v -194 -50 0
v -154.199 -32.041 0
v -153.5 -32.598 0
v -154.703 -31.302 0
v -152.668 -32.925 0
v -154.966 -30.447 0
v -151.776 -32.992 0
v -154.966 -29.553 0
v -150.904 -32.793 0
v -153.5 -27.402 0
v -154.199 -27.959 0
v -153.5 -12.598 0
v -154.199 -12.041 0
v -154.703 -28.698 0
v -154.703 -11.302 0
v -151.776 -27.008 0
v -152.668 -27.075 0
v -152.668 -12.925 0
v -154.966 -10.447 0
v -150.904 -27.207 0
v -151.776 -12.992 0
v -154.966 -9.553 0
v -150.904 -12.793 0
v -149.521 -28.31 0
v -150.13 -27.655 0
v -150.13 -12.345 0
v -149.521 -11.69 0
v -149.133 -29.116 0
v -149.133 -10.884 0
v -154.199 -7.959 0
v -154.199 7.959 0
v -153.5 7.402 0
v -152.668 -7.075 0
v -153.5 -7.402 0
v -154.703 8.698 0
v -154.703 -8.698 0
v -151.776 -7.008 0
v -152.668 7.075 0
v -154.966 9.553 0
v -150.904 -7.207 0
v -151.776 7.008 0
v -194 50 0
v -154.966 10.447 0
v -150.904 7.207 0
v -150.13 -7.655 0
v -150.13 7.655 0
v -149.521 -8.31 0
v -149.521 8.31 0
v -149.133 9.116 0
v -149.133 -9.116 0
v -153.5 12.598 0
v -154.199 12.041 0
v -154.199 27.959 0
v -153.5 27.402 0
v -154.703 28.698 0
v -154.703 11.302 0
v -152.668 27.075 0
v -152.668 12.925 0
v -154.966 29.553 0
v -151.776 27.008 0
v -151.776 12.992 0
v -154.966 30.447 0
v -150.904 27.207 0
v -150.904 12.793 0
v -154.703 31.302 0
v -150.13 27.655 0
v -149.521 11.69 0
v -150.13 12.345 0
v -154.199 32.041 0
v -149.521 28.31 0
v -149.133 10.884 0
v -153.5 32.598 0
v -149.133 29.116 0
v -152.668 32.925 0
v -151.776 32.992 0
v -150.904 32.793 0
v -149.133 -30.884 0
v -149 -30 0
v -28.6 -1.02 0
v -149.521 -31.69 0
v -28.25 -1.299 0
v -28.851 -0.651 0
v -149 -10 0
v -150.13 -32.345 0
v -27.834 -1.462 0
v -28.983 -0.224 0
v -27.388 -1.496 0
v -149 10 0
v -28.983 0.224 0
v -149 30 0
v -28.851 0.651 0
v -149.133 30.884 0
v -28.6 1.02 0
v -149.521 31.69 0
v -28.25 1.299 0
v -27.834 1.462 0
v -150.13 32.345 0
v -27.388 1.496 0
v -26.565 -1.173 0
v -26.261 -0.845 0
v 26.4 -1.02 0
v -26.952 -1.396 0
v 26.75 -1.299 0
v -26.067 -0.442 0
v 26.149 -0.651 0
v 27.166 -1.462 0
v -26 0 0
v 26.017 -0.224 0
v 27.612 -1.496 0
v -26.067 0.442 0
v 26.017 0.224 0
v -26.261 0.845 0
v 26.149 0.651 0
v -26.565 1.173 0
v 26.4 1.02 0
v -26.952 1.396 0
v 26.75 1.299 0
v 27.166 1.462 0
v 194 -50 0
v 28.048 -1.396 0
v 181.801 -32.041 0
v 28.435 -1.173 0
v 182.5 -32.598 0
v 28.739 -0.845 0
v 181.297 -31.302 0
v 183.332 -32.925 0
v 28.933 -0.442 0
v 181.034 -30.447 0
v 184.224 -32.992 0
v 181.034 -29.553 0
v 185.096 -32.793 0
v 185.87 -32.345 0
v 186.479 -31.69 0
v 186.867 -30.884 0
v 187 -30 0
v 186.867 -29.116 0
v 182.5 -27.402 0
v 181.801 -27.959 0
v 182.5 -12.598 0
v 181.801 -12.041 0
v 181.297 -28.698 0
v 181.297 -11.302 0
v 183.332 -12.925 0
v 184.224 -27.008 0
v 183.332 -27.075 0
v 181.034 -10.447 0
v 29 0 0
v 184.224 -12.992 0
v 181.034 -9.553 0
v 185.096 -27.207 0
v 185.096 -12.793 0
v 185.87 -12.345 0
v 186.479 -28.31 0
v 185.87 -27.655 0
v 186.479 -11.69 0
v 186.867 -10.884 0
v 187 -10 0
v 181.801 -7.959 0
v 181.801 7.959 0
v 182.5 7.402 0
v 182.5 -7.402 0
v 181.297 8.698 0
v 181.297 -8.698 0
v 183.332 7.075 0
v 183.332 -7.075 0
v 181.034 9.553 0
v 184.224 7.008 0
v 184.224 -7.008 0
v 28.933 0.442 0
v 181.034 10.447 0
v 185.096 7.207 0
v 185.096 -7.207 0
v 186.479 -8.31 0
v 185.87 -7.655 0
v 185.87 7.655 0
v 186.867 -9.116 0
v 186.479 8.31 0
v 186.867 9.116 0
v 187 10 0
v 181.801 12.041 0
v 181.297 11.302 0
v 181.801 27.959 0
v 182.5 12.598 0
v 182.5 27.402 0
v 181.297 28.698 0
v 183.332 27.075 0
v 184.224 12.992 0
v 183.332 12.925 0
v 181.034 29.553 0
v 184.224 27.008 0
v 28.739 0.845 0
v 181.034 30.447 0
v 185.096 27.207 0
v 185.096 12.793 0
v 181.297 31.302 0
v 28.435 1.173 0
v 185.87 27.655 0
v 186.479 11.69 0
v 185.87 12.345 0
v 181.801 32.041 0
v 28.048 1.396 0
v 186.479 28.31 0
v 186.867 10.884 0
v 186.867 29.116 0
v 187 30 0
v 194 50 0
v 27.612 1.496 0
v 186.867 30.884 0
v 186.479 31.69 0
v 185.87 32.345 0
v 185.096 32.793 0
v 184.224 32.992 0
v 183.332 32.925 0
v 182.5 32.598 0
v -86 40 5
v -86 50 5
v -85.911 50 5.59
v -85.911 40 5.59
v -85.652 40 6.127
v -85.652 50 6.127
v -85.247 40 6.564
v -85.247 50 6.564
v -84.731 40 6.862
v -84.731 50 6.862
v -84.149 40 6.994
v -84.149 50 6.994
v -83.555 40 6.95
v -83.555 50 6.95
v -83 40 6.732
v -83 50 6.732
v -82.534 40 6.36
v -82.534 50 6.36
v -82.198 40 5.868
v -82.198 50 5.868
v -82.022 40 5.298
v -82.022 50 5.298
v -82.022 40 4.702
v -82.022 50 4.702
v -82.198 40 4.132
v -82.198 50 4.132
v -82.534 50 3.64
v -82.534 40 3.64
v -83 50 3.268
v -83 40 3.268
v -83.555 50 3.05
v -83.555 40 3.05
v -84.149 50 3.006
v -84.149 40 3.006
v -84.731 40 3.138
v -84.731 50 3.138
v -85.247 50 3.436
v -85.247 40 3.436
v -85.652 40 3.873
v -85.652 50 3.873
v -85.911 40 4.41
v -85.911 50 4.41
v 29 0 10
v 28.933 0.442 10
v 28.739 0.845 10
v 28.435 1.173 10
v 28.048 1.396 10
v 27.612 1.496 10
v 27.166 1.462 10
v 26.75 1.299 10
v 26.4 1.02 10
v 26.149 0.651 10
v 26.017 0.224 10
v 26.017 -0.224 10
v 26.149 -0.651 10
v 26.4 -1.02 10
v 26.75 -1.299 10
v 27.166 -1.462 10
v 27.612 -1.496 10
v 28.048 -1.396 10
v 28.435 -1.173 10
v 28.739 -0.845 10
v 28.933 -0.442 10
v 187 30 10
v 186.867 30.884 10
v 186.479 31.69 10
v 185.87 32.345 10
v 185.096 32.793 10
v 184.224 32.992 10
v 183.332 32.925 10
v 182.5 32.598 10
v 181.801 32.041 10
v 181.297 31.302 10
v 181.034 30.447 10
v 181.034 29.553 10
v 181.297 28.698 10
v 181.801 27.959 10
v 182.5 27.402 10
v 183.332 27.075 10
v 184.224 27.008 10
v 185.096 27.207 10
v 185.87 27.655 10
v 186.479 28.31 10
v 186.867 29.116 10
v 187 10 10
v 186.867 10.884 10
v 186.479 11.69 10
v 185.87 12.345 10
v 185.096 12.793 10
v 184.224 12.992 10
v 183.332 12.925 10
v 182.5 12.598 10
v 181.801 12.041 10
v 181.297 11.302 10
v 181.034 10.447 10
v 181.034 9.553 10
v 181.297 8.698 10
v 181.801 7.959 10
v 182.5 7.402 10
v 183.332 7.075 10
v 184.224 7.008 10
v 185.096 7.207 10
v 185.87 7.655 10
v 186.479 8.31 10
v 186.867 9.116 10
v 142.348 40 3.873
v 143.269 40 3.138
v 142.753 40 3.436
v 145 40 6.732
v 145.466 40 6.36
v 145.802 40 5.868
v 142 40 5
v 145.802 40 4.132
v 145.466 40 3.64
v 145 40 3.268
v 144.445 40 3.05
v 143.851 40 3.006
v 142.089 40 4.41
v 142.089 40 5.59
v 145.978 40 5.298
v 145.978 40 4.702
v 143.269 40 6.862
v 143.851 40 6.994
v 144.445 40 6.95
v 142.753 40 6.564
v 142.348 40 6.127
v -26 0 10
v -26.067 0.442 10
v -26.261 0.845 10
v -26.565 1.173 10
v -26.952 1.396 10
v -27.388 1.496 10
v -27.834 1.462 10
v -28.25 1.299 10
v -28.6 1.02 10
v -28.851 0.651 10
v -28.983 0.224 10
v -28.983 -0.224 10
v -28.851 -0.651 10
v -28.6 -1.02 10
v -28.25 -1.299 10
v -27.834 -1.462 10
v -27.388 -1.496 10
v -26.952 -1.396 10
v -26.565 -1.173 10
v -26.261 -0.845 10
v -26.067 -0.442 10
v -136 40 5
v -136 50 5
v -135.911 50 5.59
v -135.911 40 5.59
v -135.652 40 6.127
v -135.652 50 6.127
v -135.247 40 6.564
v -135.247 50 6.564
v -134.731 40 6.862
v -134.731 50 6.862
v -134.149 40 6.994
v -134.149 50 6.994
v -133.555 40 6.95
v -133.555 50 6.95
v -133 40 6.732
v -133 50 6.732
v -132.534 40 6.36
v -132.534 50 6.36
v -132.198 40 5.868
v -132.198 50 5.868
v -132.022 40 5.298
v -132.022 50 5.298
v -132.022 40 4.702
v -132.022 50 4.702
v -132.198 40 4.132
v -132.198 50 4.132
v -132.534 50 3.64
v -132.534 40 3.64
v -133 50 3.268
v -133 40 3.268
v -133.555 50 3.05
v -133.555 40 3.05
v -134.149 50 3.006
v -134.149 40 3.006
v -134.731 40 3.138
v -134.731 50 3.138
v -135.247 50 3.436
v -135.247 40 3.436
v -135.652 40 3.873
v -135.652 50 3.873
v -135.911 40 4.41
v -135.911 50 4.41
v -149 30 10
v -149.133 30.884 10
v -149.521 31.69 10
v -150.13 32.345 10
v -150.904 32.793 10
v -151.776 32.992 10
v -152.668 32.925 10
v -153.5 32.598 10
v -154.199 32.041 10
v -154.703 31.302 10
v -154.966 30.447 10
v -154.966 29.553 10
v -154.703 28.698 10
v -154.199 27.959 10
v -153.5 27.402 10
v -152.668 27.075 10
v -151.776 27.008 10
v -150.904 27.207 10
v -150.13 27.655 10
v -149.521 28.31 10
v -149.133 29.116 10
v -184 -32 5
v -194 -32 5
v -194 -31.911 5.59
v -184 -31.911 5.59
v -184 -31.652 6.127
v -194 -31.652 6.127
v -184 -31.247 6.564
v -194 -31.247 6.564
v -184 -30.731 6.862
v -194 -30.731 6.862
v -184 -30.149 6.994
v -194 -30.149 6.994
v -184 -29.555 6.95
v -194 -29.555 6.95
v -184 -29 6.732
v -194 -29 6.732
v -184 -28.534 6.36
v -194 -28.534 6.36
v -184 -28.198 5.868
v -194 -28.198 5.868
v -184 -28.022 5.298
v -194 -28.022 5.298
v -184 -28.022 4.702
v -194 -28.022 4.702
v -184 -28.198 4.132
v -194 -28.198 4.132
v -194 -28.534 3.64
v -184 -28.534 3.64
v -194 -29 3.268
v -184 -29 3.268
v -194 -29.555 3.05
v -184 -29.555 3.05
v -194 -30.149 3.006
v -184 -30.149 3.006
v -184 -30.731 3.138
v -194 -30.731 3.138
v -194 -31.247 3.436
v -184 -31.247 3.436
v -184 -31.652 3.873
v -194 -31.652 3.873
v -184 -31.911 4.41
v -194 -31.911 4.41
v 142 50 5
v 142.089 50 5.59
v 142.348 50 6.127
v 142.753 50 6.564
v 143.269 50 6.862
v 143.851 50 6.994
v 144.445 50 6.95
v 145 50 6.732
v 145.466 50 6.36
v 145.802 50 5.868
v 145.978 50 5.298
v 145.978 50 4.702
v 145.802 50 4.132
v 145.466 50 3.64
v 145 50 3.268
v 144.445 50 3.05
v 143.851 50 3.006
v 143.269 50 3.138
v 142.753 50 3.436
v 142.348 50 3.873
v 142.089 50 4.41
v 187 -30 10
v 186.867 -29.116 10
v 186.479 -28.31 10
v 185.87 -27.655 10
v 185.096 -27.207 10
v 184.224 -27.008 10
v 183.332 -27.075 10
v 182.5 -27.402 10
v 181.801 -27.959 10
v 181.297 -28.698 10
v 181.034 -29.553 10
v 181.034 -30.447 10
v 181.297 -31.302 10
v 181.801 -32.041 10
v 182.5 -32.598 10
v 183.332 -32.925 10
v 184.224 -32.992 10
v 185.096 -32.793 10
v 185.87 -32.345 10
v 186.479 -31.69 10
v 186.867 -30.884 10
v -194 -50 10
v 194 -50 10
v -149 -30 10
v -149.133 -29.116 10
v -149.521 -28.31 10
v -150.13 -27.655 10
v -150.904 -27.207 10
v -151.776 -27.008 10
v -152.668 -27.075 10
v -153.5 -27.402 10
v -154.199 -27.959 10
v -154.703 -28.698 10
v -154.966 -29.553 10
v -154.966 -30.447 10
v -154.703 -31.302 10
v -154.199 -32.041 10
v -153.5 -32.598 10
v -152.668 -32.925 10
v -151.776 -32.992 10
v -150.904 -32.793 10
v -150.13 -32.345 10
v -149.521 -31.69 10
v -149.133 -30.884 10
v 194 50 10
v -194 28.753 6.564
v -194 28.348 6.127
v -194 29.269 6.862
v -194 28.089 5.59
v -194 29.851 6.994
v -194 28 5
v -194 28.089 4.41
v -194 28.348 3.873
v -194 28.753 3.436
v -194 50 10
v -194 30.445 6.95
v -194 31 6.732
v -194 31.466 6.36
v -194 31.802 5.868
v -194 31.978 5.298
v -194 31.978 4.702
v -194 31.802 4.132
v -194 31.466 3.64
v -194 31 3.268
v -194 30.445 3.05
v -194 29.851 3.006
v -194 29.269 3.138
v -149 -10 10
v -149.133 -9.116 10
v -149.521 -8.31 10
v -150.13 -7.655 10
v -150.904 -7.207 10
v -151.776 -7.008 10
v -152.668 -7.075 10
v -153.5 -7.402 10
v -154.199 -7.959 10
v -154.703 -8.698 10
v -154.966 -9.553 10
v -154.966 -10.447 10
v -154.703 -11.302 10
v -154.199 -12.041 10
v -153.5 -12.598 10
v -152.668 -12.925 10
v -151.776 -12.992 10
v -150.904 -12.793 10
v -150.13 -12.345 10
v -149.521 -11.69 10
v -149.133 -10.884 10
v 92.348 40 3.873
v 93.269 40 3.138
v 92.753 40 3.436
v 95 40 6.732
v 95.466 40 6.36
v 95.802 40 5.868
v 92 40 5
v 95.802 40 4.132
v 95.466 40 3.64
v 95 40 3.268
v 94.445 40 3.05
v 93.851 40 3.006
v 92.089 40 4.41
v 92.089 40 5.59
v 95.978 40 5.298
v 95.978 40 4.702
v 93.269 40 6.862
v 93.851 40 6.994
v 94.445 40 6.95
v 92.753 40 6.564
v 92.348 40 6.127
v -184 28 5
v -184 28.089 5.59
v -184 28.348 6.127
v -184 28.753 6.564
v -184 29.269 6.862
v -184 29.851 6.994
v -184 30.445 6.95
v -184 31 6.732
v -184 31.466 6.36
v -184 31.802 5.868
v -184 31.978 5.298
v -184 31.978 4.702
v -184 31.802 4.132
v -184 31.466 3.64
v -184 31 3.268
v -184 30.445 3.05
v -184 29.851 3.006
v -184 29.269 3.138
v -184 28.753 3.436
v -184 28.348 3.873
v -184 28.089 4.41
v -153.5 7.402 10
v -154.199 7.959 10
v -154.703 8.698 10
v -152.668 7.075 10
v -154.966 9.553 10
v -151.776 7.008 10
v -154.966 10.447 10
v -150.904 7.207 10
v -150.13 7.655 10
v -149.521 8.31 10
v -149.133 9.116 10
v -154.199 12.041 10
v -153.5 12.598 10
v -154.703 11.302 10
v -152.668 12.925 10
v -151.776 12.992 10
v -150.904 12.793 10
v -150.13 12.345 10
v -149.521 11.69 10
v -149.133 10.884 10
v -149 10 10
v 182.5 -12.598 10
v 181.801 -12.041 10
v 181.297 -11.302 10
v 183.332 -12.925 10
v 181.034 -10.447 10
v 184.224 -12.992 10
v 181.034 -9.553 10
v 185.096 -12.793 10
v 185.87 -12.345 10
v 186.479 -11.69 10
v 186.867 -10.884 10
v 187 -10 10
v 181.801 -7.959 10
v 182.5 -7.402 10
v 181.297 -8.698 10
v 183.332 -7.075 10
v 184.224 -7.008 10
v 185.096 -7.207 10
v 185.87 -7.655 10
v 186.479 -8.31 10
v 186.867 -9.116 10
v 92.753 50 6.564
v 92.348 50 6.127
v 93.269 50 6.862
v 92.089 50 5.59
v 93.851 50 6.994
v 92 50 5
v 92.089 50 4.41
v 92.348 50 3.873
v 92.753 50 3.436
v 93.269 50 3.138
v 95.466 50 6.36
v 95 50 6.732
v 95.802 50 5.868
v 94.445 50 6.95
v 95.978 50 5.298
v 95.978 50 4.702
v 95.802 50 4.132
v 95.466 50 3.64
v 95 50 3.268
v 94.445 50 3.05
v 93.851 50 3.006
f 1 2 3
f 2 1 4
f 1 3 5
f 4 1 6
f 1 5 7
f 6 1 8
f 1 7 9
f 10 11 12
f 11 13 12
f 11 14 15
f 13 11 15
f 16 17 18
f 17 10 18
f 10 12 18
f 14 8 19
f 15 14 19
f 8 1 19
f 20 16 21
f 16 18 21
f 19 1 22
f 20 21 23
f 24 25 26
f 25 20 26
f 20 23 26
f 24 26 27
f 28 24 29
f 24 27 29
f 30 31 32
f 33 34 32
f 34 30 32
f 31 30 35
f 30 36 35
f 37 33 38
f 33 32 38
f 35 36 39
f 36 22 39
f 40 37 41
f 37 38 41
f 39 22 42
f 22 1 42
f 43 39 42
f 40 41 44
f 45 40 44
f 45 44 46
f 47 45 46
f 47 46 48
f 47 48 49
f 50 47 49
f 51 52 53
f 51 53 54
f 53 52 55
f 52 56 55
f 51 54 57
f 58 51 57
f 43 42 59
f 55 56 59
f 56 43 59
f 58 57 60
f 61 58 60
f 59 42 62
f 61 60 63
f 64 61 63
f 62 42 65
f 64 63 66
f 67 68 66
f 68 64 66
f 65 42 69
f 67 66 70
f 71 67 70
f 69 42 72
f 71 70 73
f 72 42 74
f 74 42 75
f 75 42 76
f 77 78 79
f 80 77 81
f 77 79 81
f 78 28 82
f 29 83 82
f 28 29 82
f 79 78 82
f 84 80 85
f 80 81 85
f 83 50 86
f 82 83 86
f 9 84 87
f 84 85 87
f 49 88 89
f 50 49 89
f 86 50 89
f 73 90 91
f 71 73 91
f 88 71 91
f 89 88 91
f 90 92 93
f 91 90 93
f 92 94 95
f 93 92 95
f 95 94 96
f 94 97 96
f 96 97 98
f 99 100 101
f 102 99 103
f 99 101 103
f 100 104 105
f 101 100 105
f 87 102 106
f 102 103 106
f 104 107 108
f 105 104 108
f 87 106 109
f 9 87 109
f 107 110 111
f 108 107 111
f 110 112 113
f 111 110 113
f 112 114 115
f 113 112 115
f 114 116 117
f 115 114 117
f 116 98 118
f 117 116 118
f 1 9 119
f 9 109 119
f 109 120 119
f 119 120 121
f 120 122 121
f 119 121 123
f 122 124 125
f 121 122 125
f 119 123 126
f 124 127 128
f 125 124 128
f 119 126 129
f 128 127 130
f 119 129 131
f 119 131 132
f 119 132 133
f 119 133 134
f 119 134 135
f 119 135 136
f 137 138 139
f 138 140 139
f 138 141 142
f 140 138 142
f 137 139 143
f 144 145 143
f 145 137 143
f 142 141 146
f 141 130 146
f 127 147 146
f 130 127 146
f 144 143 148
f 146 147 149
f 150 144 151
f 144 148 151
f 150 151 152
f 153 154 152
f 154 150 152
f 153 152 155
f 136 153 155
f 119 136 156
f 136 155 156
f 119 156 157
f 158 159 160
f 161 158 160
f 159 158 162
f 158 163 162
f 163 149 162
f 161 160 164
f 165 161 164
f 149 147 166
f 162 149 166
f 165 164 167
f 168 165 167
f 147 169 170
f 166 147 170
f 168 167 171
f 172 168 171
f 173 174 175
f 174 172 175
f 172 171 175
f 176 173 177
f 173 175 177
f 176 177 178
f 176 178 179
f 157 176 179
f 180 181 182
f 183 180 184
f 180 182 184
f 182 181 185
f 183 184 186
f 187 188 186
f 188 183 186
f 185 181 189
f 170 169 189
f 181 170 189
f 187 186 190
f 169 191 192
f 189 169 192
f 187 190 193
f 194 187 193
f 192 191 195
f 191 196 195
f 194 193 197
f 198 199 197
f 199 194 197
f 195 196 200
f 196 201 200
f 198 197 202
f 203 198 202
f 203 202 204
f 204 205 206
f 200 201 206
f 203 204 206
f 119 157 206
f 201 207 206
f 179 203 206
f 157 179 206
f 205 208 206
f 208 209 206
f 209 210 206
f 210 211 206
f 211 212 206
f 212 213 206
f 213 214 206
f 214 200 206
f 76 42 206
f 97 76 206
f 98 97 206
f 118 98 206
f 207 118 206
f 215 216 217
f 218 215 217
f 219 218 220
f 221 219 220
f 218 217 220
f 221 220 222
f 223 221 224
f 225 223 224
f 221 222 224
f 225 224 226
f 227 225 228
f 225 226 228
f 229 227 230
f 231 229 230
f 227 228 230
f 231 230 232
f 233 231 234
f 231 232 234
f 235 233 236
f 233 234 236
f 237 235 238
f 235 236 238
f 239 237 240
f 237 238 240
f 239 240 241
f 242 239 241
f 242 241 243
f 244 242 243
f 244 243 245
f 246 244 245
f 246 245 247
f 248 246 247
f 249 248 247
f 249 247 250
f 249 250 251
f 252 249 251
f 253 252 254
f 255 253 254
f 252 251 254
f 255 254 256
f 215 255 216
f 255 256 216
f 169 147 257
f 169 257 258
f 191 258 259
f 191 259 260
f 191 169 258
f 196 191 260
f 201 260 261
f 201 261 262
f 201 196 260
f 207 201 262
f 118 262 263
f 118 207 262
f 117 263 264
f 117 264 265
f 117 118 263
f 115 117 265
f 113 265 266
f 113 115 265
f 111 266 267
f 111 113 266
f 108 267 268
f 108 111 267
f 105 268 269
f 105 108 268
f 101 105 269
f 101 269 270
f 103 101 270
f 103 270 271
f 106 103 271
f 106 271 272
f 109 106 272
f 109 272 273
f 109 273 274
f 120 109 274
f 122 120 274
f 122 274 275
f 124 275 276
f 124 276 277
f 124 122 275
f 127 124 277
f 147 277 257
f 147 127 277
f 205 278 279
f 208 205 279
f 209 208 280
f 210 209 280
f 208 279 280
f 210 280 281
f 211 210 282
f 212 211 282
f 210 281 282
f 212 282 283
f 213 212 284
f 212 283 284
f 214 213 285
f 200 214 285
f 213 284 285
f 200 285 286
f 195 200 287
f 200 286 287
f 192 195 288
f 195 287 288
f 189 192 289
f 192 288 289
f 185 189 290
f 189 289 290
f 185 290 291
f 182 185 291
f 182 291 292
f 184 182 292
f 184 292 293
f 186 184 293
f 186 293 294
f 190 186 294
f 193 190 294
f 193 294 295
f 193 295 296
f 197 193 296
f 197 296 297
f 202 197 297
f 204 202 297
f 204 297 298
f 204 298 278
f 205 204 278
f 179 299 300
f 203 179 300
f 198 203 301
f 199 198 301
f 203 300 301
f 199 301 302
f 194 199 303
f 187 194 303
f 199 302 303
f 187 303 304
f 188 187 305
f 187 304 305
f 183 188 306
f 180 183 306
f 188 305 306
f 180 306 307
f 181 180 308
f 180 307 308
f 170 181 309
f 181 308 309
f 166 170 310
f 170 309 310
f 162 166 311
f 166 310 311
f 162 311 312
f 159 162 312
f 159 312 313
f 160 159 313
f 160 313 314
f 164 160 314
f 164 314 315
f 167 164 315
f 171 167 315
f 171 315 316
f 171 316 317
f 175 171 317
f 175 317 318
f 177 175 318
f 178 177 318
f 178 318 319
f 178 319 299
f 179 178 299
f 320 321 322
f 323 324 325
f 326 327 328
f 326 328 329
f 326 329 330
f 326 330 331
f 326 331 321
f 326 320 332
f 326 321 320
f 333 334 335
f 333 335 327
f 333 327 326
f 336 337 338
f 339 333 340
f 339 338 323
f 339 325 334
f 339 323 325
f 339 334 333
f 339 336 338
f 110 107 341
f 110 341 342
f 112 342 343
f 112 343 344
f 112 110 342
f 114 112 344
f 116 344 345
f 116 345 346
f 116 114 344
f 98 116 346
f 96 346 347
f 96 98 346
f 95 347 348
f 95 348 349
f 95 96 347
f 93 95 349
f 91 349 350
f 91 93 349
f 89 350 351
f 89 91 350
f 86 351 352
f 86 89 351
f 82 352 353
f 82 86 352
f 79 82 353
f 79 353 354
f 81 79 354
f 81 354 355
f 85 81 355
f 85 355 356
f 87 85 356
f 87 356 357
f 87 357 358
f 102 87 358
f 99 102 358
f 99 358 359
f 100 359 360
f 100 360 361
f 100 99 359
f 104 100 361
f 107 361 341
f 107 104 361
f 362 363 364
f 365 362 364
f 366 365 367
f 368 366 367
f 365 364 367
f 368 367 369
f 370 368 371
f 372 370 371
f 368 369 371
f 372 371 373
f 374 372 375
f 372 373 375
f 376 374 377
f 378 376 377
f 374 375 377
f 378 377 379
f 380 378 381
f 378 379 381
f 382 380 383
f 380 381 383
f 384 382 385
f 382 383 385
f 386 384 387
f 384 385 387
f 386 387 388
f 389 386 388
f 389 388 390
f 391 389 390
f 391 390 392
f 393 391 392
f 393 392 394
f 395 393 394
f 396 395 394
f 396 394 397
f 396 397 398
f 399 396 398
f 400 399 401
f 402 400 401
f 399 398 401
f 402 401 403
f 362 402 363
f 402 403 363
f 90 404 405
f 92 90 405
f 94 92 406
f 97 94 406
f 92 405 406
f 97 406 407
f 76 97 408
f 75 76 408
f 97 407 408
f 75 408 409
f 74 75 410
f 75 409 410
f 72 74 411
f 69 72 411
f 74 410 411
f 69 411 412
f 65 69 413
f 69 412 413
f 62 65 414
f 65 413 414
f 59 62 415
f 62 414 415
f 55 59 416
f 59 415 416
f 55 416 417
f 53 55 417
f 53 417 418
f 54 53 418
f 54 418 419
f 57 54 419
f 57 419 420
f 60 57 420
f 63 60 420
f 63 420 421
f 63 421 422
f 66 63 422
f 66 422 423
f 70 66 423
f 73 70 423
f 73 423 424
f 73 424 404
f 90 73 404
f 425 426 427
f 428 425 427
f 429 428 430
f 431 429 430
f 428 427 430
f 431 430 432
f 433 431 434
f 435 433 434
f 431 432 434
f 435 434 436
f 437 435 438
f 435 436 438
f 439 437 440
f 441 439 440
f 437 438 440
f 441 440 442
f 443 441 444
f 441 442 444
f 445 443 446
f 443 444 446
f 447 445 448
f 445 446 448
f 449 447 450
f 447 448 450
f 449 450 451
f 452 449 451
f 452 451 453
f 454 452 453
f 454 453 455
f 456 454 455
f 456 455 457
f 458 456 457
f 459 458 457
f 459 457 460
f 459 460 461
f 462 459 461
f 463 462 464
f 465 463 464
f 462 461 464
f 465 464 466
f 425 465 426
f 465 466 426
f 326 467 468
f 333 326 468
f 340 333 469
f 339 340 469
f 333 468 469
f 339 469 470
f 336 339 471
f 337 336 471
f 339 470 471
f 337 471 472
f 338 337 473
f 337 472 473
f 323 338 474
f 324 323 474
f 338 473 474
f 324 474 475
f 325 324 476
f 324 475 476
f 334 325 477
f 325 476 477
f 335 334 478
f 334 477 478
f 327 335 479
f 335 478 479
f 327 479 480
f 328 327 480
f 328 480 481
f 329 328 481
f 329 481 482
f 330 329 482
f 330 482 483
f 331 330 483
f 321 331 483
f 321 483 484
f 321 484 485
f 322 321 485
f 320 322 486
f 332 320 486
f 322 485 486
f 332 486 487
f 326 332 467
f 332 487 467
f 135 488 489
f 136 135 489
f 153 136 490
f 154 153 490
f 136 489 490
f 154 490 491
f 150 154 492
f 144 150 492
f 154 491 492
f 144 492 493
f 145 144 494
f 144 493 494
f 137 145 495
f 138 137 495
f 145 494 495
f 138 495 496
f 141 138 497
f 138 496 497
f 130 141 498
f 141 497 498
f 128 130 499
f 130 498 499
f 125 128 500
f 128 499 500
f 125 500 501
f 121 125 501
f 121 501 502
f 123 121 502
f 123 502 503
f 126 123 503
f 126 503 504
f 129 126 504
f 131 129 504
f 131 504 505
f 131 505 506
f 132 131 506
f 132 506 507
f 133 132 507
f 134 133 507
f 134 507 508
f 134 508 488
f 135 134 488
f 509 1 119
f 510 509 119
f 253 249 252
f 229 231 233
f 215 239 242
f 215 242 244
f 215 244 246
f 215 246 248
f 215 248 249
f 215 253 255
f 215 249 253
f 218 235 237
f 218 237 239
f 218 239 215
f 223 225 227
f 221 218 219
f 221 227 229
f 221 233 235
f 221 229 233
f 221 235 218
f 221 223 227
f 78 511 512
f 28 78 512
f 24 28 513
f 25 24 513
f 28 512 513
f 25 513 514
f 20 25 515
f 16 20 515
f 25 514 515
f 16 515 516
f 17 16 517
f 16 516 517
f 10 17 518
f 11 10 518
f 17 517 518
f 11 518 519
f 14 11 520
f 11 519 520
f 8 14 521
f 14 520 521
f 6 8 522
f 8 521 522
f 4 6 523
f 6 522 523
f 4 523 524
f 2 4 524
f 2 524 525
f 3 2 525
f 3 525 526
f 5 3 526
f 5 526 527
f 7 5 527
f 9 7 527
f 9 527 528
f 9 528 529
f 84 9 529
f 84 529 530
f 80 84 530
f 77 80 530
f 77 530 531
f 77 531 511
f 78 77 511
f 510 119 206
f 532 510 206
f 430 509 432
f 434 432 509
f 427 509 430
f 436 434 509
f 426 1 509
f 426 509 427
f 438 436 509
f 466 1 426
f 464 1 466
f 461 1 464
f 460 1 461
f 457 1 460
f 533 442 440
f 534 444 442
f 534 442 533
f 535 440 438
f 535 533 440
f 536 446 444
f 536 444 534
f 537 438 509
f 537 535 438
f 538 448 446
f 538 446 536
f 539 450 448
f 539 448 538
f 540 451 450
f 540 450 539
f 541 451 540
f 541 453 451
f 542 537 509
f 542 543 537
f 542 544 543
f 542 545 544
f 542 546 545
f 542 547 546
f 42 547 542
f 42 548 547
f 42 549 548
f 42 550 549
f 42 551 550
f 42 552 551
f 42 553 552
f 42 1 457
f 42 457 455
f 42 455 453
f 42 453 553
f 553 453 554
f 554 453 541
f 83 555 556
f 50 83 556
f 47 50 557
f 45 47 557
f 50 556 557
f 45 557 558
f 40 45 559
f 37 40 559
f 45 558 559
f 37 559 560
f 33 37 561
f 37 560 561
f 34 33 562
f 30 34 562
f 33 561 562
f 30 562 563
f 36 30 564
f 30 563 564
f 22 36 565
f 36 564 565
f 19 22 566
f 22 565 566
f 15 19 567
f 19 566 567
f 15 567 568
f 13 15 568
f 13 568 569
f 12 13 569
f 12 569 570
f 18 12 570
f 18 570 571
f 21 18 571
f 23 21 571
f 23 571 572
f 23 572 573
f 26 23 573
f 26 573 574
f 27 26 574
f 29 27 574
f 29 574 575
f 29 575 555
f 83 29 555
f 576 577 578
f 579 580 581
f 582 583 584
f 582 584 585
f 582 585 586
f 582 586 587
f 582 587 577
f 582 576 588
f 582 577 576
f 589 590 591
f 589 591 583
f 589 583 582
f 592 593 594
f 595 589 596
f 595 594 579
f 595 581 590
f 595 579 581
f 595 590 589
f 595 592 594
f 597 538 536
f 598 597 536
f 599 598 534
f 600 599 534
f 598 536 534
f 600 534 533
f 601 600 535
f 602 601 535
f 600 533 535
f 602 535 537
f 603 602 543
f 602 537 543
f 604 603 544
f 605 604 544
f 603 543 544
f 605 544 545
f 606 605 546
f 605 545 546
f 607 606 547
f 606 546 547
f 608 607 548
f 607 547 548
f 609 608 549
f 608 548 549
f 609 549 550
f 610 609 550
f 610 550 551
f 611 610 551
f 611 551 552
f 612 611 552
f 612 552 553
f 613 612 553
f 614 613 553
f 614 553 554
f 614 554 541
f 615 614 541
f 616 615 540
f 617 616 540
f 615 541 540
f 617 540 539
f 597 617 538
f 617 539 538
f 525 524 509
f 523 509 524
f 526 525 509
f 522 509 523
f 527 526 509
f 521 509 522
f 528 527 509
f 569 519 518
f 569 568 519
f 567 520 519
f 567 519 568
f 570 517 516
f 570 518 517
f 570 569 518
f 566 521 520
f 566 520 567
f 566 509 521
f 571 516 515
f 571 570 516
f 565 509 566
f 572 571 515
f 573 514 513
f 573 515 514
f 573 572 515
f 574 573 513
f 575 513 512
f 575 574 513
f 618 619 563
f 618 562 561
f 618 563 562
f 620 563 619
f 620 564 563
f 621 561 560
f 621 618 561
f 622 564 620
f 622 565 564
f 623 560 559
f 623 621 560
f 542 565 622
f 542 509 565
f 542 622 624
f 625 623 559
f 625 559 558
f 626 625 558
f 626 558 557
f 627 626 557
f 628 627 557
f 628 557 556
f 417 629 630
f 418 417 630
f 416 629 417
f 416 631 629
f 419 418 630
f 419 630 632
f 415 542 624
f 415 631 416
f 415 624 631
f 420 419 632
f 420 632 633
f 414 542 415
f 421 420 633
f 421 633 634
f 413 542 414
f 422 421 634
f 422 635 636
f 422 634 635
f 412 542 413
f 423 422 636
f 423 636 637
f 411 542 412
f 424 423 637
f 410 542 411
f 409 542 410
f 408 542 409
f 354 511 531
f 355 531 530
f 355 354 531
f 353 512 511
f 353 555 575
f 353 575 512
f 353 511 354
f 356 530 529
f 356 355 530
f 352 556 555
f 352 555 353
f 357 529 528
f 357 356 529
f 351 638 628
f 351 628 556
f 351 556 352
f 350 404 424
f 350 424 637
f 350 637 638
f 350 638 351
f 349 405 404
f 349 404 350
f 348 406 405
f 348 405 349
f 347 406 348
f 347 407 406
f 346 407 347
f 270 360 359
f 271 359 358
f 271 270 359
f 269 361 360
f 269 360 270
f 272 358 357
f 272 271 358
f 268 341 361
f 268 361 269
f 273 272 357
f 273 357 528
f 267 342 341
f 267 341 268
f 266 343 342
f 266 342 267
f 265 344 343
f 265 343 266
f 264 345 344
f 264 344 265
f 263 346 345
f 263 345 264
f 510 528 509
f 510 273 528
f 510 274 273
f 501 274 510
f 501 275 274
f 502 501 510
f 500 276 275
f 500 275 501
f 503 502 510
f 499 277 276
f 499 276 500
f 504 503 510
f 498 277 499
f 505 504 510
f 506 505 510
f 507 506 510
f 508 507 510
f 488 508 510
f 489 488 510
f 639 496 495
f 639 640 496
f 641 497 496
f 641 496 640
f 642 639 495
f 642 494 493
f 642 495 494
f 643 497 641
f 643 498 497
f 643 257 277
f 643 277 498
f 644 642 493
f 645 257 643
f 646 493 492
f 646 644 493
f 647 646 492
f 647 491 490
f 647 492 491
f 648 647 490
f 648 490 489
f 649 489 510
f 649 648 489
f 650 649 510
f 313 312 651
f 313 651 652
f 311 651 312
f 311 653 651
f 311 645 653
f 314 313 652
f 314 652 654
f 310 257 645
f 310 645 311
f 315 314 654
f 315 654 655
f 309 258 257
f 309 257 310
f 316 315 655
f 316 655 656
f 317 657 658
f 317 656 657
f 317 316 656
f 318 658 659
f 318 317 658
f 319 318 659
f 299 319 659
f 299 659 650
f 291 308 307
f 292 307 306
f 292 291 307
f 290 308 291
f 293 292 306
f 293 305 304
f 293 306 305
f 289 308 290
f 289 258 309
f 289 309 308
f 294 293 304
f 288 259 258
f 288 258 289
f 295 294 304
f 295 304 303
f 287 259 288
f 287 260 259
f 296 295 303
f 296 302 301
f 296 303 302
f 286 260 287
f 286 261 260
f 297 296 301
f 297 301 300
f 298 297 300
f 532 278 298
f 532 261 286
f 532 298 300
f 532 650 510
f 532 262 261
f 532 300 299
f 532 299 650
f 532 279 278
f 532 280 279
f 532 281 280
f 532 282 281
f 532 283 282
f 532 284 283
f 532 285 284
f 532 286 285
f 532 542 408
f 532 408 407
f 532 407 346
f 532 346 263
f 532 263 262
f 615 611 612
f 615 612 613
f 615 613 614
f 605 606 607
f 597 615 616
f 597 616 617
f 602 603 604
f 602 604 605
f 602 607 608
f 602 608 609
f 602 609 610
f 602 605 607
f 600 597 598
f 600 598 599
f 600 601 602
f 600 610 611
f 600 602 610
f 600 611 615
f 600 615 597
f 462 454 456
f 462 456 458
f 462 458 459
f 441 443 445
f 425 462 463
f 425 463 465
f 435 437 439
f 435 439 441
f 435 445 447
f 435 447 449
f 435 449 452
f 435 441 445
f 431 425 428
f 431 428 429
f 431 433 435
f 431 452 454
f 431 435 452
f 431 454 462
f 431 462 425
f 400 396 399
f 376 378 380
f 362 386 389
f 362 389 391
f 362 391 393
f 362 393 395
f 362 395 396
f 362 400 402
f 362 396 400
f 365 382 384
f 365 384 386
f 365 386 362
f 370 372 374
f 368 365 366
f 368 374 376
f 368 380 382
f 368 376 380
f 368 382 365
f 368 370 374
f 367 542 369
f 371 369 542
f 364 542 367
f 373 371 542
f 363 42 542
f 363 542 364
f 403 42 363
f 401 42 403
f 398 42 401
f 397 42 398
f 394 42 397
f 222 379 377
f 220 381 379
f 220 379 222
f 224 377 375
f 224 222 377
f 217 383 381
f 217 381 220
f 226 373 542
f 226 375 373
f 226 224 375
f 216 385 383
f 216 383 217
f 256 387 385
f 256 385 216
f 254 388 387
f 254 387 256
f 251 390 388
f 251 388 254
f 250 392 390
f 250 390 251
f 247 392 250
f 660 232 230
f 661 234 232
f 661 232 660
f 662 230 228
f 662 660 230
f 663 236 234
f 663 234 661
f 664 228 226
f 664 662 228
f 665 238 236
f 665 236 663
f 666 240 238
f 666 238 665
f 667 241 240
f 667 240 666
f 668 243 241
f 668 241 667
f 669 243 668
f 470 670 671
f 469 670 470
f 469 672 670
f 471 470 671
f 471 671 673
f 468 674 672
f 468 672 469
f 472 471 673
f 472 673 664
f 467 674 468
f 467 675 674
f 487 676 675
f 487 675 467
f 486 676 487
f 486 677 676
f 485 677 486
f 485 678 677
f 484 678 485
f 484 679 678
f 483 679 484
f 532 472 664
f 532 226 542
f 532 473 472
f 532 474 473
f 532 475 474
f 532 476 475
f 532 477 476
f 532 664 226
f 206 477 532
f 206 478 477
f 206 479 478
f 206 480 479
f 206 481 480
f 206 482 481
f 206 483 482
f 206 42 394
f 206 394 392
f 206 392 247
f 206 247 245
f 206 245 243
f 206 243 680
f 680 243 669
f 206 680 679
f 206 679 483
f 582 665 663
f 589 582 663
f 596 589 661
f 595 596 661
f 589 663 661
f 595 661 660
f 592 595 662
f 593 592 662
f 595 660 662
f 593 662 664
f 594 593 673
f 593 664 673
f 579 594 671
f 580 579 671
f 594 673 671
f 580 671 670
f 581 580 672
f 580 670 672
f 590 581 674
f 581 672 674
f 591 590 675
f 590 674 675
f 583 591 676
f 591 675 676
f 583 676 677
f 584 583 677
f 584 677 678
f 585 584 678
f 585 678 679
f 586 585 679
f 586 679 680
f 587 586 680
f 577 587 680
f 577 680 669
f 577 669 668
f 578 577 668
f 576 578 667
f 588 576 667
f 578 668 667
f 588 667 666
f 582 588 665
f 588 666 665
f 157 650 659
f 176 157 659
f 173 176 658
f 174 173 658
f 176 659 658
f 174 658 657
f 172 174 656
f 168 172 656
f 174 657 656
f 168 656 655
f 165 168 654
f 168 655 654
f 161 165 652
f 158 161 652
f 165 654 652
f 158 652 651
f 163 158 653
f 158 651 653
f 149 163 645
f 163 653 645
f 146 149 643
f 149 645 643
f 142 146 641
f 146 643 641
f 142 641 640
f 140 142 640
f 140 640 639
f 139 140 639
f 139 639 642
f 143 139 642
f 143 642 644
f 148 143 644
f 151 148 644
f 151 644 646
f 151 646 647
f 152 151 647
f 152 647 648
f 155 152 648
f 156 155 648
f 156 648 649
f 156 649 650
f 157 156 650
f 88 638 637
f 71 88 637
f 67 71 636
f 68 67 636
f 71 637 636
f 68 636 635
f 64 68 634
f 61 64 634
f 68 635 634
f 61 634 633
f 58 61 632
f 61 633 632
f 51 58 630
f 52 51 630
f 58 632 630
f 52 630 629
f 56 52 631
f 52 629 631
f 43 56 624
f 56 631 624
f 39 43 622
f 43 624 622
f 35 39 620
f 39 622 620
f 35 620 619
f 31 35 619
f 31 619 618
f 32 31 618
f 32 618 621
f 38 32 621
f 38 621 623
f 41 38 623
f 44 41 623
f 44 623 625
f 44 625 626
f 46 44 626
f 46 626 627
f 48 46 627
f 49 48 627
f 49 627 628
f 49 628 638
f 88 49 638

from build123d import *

# Parameters (mm, degrees)
F0_W     = 388
F0_H     = 100
F0_R     = 1.5
F1_DEPTH = 10
F2_R     = 2
F3_DEPTH = 10
F4_R     = 2
F5_DEPTH = 10
F6_R     = 3
F7_DEPTH = 25


with BuildPart() as f1:
    # F0 (on Top) → F1 (new body)
    with BuildSketch(Plane.XY):
        Rectangle(F0_W, F0_H)
        with Locations((-27.5, 0)):
            Circle(F0_R, mode=Mode.SUBTRACT)
        with Locations((27.5, 0)):
            Circle(F0_R, mode=Mode.SUBTRACT)
    extrude(amount=F1_DEPTH)

    # F2 (on face) → F3 (cut)
    with BuildSketch(Plane(origin=(0, 50, 0), x_dir=(-1, 0, 0), z_dir=(0, 1, 0))):
        with Locations((-144, 5)):
            Circle(F2_R)
        with Locations((134, 5)):
            Circle(F2_R)
        with Locations((-94, 5)):
            Circle(F2_R)
        with Locations((84, 5)):
            Circle(F2_R)
    extrude(amount=-F3_DEPTH, mode=Mode.SUBTRACT)

    # F4 (on face) → F5 (cut)
    with BuildSketch(Plane(origin=(-194, 0, 0), x_dir=(0, -1, 0), z_dir=(-1, 0, 0))):
        with Locations((-30, 5)):
            Circle(F4_R)
        with Locations((30, 5)):
            Circle(F4_R)
    extrude(amount=-F5_DEPTH, mode=Mode.SUBTRACT)

    # F6 (on face) → F7 (cut)
    with BuildSketch(Plane.XY.offset(10)):
        with Locations((184, -30)):
            Circle(F6_R)
        with Locations((184, 10)):
            Circle(F6_R)
        with Locations((184, 30)):
            Circle(F6_R)
        with Locations((184, -10)):
            Circle(F6_R)
        with Locations((-152, 30)):
            Circle(F6_R)
        with Locations((-152, 10)):
            Circle(F6_R)
        with Locations((-152, -30)):
            Circle(F6_R)
        with Locations((-152, -10)):
            Circle(F6_R)
    extrude(amount=-F7_DEPTH, mode=Mode.SUBTRACT)


solid = f1.part
